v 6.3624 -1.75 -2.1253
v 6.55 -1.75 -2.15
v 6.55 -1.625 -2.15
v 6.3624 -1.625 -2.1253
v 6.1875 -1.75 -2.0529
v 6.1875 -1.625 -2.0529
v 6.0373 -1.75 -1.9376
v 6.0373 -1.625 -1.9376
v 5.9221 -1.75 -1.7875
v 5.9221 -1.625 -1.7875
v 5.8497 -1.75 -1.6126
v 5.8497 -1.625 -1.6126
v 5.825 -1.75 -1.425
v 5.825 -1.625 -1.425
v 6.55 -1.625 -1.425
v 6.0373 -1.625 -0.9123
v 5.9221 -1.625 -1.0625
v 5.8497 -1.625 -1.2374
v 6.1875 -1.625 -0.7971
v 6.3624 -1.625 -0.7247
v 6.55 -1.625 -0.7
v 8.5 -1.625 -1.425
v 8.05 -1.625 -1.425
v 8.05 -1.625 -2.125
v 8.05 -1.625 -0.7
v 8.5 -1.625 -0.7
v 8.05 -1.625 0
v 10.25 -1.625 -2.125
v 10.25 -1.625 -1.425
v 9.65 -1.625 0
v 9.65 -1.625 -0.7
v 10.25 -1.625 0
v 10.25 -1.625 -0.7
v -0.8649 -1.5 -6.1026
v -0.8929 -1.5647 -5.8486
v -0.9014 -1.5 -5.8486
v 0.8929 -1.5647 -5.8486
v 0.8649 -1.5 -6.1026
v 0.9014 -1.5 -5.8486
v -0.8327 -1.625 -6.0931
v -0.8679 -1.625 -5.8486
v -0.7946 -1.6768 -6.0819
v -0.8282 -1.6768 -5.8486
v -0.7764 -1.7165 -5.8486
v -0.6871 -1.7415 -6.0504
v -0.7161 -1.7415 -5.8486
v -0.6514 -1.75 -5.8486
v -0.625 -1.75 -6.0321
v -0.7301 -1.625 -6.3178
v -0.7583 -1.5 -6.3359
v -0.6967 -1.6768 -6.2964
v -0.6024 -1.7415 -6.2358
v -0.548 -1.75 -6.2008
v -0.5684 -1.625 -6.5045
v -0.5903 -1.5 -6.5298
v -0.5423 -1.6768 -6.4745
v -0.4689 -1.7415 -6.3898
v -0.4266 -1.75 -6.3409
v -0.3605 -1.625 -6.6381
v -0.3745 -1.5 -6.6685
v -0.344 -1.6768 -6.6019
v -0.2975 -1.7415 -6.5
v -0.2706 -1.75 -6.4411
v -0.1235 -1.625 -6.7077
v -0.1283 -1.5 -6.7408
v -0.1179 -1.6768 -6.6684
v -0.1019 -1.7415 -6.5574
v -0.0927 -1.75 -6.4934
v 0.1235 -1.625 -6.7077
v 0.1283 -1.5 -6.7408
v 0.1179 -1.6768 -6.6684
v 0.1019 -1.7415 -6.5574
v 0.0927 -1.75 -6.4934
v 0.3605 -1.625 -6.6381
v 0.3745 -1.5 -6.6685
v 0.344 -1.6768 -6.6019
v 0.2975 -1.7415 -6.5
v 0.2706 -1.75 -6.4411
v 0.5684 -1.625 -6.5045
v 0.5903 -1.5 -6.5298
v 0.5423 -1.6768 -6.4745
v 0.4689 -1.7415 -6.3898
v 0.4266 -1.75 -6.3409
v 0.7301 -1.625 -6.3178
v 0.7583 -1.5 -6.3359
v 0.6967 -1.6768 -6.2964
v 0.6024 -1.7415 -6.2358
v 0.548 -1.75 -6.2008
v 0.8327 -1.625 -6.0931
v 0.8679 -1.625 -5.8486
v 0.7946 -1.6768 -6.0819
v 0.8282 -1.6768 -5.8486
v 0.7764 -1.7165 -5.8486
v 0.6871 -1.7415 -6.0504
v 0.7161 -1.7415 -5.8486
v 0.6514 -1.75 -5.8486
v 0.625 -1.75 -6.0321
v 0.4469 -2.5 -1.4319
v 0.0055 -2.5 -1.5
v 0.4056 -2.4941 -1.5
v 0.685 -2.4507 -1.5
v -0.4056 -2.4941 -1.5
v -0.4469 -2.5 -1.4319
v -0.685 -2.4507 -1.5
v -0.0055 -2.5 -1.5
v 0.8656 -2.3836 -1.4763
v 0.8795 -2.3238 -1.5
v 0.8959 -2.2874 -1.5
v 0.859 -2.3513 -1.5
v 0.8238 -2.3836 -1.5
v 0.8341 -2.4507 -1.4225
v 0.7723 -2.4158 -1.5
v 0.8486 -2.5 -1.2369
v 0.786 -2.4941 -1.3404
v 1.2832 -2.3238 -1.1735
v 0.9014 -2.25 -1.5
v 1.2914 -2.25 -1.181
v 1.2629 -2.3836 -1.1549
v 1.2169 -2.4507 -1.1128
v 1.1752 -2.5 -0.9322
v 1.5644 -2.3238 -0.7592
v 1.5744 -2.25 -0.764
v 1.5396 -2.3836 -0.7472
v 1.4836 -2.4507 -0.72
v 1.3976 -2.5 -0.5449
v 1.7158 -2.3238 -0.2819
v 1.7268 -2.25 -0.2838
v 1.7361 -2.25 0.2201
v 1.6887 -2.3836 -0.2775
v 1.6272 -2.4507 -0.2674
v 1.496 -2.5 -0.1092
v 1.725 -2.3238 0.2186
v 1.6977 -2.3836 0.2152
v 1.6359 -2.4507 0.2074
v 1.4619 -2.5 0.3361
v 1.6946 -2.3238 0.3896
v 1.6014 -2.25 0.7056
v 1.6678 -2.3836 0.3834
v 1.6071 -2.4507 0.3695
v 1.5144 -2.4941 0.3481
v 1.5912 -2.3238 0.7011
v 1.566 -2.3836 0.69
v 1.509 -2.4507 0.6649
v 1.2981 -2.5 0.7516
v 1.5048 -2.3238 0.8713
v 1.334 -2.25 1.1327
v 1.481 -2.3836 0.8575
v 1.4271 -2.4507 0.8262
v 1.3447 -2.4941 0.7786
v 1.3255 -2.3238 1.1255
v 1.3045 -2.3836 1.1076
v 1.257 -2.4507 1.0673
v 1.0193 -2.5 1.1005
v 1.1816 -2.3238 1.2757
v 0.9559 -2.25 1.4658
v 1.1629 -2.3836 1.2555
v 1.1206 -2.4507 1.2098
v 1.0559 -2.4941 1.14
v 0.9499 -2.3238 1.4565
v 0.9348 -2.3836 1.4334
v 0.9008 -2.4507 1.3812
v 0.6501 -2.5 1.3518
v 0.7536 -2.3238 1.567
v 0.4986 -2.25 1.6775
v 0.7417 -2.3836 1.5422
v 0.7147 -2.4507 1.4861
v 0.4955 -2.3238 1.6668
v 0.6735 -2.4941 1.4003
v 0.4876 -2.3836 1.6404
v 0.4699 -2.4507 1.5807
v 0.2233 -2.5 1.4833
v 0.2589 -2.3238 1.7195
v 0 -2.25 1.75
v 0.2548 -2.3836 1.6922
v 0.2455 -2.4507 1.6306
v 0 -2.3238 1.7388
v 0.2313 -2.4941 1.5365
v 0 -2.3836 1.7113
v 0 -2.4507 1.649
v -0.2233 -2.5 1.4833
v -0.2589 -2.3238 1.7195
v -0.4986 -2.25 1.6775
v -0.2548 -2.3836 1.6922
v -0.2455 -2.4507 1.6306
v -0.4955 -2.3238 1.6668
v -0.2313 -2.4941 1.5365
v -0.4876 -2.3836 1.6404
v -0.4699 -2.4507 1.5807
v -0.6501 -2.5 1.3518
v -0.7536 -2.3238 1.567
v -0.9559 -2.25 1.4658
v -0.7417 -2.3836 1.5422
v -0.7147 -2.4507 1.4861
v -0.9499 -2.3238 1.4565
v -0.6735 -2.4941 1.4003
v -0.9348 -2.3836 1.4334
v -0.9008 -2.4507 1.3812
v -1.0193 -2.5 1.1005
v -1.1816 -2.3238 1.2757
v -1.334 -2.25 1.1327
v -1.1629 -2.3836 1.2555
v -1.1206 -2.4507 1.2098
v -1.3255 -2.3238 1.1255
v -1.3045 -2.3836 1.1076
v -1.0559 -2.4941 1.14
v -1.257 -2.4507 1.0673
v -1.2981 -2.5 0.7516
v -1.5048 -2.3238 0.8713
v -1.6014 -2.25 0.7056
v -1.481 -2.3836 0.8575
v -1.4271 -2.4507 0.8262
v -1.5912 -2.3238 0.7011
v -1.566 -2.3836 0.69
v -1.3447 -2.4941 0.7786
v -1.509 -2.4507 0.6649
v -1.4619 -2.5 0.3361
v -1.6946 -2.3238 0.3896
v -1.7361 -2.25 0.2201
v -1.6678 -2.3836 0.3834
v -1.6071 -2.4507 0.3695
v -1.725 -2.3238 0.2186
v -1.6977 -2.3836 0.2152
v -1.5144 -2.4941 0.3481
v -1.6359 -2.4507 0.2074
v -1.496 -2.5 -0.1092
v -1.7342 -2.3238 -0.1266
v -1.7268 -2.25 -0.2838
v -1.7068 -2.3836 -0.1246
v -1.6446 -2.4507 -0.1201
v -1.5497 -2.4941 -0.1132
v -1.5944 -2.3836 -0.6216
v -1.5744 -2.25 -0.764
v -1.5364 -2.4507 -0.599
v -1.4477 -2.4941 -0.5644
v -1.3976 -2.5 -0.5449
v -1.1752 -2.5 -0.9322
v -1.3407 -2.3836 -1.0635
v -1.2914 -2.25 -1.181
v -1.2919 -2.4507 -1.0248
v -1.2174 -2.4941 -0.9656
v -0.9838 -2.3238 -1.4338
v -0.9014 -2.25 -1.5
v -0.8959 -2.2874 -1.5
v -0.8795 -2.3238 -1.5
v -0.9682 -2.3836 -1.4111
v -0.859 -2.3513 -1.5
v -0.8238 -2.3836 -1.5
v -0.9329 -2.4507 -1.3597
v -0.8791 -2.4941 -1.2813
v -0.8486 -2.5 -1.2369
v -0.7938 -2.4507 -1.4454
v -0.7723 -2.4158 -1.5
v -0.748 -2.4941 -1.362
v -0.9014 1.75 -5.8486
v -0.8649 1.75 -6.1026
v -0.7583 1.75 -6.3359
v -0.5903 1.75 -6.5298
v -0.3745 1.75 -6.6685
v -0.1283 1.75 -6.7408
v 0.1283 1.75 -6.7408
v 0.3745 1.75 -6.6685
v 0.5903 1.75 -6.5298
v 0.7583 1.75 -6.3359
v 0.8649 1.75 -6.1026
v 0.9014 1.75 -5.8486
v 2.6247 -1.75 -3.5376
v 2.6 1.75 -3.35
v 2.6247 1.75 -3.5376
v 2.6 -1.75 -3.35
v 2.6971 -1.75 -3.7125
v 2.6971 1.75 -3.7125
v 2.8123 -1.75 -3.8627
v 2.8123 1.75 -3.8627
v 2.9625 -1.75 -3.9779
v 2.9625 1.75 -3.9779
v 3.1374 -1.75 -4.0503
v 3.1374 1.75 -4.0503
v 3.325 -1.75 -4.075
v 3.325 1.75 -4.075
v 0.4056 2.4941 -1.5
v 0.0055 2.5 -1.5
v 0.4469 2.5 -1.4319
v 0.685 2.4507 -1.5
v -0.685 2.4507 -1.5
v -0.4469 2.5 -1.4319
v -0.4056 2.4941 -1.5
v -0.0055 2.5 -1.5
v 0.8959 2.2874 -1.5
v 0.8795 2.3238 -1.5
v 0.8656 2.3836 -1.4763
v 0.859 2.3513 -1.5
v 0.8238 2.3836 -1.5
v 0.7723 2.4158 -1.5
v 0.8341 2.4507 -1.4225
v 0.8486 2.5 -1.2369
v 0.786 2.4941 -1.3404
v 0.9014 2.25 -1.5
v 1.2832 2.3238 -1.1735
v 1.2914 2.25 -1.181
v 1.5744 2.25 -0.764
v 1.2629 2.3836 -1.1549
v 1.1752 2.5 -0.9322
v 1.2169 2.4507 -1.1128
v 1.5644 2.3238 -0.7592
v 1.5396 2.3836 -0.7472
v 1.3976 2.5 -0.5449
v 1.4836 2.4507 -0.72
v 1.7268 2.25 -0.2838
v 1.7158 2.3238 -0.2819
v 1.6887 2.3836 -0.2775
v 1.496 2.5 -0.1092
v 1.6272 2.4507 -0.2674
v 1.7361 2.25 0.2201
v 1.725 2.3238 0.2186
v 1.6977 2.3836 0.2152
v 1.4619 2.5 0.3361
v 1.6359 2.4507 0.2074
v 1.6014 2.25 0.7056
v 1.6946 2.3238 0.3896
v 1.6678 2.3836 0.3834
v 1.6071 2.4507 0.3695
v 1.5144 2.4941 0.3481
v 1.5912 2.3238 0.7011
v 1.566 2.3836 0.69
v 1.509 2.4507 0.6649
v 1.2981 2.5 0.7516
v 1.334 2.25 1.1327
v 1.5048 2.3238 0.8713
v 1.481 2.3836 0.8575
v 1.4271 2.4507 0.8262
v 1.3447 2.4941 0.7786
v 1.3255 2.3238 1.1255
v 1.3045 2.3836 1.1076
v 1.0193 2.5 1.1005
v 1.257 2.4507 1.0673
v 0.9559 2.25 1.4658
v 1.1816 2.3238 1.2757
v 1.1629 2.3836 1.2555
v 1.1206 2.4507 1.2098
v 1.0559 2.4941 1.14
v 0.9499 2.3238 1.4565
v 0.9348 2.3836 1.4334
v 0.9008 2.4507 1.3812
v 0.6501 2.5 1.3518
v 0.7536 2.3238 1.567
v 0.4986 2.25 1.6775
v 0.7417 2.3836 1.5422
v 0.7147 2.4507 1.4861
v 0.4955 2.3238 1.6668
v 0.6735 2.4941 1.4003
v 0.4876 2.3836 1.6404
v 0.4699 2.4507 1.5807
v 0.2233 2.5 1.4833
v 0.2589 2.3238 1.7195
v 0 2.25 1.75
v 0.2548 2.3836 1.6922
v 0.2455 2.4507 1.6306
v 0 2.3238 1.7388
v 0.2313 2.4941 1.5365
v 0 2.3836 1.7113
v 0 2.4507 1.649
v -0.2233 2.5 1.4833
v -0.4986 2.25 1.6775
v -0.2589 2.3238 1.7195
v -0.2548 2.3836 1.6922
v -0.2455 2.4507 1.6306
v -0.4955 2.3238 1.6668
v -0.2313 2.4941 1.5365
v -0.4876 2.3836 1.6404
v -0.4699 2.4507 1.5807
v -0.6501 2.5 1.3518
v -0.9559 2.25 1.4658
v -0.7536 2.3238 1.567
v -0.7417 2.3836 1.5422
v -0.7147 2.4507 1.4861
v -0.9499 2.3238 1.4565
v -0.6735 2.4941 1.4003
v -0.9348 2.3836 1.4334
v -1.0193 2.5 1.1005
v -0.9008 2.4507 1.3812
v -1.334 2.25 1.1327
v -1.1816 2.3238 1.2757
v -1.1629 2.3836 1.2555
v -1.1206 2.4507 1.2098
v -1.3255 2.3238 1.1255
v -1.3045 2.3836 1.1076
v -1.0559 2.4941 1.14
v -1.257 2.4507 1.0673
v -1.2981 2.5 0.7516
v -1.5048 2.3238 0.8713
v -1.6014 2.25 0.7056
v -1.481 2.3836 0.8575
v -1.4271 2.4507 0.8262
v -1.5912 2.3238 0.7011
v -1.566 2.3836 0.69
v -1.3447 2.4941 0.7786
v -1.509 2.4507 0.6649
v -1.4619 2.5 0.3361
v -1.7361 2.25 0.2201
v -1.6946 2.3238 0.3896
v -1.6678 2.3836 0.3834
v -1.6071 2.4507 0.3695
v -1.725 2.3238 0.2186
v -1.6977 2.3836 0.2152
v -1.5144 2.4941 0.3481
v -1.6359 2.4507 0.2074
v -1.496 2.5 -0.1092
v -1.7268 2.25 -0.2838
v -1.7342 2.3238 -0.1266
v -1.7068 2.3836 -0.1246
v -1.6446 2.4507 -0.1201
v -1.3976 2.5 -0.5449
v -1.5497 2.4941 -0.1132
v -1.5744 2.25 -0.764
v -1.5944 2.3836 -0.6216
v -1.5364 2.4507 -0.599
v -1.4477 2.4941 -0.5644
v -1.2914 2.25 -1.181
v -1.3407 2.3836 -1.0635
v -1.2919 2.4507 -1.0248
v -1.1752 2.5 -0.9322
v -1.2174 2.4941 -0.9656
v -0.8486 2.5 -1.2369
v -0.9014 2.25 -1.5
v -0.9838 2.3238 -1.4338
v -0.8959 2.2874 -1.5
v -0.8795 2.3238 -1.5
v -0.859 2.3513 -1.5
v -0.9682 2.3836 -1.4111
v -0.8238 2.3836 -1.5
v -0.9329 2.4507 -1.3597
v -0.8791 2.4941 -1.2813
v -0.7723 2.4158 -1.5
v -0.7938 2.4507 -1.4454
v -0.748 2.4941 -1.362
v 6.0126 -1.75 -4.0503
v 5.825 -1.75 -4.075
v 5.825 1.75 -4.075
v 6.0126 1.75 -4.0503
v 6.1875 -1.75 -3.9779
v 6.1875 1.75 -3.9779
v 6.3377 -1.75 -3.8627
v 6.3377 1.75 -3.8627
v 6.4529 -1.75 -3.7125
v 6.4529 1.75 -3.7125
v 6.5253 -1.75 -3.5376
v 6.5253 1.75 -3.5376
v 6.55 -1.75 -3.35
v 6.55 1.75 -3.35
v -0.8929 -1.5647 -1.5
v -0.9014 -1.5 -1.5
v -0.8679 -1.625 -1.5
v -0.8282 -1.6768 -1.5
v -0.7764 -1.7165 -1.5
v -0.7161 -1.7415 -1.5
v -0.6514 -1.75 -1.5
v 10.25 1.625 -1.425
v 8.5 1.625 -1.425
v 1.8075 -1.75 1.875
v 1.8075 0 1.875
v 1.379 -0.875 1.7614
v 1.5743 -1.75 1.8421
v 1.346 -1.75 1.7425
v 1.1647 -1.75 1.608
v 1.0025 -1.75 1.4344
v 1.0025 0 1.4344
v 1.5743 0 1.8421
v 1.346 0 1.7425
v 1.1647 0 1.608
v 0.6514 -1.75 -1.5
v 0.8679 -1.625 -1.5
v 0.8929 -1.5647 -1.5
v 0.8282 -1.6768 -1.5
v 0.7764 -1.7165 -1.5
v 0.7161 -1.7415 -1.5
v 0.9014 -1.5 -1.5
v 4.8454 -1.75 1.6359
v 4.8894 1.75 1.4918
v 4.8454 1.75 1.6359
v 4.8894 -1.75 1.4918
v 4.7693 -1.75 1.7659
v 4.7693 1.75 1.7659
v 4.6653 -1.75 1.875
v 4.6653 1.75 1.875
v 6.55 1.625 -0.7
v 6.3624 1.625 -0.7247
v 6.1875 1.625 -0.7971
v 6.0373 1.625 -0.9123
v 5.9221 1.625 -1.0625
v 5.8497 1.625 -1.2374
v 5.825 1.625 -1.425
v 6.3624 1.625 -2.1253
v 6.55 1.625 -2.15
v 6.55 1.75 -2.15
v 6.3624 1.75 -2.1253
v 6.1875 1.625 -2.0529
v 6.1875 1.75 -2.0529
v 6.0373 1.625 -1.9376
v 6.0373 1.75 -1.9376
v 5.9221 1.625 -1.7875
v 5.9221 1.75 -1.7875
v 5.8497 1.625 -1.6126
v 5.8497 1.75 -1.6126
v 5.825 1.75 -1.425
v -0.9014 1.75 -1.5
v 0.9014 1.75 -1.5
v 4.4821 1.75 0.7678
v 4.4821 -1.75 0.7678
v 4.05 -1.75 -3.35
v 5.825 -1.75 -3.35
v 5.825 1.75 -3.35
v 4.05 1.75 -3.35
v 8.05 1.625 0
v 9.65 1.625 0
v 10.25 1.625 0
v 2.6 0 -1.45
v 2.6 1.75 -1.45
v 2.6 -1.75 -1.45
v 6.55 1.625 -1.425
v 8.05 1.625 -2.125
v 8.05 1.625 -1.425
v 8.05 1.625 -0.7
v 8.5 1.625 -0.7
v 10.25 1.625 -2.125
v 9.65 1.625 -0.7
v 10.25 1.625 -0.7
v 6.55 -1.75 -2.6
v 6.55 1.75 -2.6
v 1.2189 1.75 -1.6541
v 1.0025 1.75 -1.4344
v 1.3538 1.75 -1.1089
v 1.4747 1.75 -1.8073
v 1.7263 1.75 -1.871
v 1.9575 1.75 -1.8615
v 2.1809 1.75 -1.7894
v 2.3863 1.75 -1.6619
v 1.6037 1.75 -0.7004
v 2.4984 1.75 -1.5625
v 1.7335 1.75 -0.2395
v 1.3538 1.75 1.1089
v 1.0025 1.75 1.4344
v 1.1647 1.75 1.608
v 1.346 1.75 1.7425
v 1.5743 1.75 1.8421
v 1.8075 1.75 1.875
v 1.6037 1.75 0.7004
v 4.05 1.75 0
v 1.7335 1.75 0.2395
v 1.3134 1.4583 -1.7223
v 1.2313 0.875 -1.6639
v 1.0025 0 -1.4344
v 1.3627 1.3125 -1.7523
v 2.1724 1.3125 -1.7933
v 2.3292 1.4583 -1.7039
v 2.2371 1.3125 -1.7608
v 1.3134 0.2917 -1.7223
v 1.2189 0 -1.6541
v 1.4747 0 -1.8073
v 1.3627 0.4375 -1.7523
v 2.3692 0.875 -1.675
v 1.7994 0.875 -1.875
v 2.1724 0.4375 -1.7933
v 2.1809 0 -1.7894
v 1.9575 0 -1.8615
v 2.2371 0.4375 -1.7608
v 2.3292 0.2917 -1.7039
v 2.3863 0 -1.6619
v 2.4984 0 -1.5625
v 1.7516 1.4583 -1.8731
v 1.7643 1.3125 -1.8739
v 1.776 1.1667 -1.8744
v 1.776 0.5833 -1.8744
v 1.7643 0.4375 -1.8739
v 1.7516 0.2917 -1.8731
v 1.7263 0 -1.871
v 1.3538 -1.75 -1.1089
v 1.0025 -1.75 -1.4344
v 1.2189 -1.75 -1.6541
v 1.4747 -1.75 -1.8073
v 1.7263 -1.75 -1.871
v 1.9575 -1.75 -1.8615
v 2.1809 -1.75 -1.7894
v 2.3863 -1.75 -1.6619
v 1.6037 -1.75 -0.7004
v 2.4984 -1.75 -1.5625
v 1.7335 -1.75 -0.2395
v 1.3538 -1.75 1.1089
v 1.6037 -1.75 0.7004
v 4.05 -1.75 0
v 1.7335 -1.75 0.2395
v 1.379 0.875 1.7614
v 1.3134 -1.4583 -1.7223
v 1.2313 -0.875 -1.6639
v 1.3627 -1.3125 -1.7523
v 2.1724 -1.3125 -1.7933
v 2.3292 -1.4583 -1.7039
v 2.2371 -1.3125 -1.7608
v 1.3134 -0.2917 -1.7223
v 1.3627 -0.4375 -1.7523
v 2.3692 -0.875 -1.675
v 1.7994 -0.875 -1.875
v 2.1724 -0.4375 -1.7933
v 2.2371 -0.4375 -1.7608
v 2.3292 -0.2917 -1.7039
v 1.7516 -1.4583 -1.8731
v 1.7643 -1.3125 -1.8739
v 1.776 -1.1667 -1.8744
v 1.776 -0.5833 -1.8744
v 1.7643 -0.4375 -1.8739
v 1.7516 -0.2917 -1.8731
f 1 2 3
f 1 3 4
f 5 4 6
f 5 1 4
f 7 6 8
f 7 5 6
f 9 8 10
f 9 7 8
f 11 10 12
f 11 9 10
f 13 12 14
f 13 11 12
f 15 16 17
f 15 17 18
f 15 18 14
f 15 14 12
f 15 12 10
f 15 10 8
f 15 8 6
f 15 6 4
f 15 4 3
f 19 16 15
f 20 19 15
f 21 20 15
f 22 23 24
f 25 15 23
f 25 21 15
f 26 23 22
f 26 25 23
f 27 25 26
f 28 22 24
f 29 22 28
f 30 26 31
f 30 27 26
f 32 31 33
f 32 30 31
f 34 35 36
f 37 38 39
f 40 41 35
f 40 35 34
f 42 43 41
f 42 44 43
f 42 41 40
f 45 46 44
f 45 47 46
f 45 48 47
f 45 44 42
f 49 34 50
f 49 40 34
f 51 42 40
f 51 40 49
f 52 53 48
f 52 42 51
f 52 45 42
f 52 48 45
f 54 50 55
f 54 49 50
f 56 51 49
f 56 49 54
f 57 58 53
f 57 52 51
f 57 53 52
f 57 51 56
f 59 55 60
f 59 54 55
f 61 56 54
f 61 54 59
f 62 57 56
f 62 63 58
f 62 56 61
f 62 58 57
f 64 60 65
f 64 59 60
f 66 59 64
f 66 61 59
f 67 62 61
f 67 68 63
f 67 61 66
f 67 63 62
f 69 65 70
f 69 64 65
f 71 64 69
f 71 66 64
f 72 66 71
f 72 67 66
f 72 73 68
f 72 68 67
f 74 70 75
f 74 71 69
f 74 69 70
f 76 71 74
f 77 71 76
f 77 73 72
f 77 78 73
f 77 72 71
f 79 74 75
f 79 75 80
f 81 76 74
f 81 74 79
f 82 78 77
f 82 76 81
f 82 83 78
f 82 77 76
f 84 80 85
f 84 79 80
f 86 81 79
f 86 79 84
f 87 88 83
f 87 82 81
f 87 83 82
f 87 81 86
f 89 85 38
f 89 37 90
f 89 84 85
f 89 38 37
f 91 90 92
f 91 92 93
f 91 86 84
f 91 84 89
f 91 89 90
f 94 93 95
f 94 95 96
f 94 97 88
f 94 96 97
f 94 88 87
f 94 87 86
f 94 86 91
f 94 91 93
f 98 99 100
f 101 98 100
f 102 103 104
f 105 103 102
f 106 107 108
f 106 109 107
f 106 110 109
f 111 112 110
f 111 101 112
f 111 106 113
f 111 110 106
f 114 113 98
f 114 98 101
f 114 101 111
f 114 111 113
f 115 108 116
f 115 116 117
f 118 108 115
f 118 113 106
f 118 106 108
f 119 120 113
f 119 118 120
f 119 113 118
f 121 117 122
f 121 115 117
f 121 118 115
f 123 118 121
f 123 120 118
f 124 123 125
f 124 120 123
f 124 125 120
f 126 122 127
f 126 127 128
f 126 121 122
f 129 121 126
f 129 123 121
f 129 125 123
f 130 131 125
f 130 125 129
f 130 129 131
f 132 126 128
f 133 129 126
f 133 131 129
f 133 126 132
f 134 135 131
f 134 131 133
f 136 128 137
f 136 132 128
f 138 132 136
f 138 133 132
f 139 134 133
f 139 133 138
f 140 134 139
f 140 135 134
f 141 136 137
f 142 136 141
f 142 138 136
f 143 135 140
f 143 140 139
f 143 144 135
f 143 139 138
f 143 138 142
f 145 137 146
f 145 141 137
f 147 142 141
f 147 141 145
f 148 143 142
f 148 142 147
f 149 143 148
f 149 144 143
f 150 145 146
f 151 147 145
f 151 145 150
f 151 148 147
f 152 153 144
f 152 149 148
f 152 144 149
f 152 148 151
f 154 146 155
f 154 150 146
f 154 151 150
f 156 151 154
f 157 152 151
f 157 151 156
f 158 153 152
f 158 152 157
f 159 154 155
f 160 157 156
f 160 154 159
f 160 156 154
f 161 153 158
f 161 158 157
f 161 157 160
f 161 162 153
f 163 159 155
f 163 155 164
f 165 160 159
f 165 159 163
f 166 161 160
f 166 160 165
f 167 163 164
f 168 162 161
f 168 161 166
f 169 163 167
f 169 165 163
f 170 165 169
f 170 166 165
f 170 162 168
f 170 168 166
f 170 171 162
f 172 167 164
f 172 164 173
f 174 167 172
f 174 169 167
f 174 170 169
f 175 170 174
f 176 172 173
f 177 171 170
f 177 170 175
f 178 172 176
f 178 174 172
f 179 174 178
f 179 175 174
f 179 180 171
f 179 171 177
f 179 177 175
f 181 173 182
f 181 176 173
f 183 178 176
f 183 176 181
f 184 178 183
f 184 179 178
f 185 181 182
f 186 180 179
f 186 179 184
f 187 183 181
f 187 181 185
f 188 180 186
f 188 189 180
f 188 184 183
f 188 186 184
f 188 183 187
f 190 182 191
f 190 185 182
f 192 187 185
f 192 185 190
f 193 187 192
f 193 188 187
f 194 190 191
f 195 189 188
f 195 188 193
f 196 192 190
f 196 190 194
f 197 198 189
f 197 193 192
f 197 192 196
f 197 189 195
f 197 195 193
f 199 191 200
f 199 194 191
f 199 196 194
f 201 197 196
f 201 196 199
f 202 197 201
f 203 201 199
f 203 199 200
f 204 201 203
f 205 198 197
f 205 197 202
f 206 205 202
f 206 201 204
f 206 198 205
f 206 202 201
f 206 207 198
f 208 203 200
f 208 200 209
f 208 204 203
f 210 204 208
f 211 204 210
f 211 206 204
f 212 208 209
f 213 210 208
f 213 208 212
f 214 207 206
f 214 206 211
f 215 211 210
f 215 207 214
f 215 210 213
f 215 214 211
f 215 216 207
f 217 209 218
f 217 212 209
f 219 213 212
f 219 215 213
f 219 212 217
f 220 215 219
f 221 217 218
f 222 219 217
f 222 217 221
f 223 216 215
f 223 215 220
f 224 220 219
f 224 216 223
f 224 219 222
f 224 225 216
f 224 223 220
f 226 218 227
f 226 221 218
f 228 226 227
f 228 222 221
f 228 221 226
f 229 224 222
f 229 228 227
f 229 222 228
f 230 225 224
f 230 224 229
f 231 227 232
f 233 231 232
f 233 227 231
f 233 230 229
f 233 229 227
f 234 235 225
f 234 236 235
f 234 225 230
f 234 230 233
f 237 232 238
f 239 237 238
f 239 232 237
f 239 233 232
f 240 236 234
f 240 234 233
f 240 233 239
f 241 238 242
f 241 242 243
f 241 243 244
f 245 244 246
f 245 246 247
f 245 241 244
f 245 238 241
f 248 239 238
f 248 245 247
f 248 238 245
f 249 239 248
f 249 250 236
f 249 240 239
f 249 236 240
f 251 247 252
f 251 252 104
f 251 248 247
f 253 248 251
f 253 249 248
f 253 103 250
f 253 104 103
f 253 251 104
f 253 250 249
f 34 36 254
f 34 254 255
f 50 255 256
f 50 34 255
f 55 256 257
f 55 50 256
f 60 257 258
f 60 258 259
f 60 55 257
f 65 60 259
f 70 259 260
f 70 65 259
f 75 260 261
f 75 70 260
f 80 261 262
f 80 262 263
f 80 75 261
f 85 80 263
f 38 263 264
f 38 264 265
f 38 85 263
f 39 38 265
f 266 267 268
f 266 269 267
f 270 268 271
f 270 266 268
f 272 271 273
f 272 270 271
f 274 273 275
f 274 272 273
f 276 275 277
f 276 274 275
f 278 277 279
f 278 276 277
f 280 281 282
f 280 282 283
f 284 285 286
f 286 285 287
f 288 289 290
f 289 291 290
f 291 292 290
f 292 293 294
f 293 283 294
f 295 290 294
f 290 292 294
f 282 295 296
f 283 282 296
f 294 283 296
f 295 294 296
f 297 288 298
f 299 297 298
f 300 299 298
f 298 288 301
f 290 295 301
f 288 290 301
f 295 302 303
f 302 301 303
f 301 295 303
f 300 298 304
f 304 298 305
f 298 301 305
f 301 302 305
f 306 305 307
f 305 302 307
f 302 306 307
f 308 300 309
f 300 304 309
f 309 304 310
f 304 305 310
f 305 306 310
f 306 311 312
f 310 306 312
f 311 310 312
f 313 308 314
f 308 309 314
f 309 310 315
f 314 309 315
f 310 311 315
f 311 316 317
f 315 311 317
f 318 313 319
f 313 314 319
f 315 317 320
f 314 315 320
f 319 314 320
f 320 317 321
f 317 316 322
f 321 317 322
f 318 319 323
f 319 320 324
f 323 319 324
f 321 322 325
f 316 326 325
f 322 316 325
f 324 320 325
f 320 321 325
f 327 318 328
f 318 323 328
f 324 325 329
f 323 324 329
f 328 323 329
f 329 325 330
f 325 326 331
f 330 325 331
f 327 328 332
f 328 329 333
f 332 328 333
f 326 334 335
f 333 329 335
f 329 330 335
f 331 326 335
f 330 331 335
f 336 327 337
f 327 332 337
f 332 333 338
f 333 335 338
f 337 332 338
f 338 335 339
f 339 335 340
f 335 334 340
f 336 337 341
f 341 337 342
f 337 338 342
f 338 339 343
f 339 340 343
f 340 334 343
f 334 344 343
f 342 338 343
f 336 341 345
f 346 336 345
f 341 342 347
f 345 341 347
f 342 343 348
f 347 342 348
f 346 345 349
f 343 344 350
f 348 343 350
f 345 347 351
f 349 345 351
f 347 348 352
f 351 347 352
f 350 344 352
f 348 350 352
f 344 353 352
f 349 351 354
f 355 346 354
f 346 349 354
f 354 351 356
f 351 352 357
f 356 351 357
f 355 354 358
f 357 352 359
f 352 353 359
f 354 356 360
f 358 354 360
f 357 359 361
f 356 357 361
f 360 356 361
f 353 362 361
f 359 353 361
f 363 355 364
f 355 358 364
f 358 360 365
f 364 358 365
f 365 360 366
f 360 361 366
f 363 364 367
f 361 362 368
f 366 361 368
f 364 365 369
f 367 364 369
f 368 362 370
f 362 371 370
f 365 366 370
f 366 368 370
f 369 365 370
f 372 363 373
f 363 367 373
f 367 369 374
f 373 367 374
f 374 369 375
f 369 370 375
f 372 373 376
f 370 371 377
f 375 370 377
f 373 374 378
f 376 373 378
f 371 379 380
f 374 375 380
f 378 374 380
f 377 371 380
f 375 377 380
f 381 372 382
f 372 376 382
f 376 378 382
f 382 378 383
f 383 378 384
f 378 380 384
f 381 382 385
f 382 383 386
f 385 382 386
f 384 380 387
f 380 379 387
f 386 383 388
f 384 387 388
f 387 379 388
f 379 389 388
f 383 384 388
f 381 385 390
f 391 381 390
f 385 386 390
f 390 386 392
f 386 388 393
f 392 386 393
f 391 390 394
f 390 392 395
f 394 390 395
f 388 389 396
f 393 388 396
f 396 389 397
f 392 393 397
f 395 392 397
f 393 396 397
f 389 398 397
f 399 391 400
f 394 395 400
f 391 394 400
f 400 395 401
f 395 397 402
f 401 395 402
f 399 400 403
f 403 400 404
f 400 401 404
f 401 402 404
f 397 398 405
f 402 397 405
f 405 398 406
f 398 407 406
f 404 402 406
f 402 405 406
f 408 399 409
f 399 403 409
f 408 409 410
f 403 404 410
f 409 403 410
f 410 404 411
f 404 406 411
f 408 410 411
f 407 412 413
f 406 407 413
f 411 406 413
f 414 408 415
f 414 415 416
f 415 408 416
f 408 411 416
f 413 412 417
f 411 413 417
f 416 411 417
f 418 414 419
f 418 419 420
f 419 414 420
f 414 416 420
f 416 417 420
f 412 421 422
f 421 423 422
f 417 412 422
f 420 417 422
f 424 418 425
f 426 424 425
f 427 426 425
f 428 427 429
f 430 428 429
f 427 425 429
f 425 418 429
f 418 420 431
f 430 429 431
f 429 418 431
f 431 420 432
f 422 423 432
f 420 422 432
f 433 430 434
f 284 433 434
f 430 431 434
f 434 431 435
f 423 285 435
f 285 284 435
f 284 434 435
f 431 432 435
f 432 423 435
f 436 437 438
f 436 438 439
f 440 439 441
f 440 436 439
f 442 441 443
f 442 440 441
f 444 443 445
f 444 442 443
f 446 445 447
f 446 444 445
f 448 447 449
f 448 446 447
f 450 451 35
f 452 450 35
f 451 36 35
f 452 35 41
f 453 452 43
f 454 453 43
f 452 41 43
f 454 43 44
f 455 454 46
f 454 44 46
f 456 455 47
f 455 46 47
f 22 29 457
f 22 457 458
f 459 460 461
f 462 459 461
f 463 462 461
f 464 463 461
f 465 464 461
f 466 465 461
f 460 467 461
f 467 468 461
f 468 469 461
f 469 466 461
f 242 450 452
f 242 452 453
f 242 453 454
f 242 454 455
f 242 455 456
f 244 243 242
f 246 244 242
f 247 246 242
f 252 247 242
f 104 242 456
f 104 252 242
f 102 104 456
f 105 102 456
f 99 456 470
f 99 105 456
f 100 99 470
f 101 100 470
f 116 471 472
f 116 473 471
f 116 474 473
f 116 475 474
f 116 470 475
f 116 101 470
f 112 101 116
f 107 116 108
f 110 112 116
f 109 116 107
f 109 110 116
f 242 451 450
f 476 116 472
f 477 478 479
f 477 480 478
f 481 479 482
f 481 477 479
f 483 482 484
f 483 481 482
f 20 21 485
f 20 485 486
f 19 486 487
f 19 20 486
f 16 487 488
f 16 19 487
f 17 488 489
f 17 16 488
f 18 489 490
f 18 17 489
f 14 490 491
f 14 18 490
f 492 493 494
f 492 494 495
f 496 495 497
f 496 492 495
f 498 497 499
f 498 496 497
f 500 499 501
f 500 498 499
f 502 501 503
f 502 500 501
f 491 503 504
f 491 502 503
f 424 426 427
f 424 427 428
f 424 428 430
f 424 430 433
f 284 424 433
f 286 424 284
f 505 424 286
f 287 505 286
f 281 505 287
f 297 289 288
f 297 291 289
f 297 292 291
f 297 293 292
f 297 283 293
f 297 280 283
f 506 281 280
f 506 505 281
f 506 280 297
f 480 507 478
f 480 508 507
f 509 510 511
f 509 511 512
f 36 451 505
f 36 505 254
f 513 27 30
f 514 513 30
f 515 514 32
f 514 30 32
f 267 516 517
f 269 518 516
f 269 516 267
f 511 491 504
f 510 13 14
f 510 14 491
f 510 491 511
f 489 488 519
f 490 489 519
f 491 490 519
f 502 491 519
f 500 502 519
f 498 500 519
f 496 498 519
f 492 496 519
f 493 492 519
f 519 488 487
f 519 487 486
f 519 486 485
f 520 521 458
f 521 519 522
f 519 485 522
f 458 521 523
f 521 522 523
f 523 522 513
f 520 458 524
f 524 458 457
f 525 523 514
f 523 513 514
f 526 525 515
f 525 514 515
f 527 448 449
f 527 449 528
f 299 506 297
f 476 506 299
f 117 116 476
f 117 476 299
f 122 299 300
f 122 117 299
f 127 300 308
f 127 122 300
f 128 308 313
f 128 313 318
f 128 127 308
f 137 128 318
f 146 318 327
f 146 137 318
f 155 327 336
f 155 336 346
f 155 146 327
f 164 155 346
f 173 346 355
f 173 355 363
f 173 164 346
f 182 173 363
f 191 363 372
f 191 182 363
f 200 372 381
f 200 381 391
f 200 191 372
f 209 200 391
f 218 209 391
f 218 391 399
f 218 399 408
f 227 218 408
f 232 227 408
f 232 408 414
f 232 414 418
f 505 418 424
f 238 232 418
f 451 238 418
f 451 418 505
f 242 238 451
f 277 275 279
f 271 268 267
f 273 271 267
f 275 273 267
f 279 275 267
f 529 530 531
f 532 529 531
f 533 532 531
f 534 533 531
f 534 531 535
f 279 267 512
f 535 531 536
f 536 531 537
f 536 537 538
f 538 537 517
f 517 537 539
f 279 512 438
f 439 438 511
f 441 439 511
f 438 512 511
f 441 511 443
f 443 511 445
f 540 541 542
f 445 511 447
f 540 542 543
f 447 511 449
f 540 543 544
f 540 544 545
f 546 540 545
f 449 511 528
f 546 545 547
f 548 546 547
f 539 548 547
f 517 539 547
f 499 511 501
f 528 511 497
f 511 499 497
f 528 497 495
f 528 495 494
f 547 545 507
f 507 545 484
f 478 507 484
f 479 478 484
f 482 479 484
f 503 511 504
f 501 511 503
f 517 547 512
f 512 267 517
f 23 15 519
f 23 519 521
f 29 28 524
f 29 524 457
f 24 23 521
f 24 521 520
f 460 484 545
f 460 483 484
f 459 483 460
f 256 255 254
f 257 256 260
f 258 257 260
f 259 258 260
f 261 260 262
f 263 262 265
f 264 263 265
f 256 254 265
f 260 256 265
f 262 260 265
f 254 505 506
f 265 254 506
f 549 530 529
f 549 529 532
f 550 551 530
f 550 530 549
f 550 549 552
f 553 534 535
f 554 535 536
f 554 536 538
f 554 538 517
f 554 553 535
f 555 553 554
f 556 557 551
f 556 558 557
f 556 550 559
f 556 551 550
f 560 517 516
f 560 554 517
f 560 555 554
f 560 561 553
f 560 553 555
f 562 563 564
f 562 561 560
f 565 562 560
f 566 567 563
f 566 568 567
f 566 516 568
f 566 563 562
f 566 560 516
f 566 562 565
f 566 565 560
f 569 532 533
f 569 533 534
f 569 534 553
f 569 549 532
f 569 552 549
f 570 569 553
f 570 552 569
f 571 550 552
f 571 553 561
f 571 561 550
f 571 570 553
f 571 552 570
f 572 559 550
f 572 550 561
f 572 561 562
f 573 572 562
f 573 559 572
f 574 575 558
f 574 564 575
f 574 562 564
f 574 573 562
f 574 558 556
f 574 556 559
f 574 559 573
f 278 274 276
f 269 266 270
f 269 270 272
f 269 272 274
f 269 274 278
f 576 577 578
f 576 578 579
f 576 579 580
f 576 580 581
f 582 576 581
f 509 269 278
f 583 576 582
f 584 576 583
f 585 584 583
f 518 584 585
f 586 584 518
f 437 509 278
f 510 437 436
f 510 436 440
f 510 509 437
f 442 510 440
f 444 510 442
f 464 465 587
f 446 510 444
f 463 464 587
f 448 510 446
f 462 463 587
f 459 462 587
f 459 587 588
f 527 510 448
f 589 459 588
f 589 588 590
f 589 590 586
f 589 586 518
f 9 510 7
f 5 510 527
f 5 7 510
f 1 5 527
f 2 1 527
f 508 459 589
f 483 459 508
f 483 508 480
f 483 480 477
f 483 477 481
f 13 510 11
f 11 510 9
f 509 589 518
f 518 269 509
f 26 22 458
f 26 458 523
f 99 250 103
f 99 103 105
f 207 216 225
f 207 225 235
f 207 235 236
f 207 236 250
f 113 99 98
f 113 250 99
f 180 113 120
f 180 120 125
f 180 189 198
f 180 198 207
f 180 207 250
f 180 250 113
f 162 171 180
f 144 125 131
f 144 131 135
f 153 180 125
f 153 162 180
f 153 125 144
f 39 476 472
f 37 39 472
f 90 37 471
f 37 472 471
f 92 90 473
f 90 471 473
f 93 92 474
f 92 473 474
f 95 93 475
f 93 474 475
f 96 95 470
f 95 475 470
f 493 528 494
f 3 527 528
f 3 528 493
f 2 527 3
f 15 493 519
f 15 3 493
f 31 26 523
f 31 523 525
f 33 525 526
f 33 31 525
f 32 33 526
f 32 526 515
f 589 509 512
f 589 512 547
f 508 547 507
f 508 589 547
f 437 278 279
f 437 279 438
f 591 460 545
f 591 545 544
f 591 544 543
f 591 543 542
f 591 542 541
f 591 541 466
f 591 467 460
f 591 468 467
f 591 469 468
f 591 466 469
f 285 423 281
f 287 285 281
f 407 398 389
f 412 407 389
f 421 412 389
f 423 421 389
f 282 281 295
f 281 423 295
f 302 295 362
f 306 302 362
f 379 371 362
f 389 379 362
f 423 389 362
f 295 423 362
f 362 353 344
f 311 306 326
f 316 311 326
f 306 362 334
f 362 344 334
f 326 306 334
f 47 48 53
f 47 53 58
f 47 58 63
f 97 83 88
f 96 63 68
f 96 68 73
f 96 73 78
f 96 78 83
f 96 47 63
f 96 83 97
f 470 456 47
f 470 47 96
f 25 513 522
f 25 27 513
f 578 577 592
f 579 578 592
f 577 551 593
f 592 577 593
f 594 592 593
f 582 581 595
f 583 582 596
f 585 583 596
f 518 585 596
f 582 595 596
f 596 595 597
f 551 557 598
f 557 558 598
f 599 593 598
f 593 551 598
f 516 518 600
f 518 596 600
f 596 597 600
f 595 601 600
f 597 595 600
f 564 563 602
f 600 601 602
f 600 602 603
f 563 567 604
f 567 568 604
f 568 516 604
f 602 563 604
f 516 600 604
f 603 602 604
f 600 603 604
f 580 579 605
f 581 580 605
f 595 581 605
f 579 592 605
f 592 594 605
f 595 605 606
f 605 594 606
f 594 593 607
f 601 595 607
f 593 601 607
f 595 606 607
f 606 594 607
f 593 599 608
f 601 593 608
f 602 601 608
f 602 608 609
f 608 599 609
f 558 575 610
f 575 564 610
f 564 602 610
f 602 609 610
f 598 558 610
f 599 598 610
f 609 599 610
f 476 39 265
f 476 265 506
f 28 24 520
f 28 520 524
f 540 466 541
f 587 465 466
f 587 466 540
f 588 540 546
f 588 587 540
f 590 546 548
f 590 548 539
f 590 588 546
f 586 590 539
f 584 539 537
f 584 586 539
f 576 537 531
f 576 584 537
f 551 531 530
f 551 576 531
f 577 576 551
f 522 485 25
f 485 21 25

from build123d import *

# Parameters (mm, degrees)
F1_DEPTH = 2.5
F2_DEPTH = 1.75
F3_R     = 0.24999
F6_DEPTH = 1.75
F7_DEPTH = 1.75
F5_W     = 0.725
F5_H     = 0.725
F8_DEPTH = 1.75
F5_W_2   = 1.5000037169
F5_H_2   = 0.7249962804
F5_W_3   = 0.6
F5_H_3   = 0.6999998717
F5_H_4   = 0.6999961522
F9_DEPTH = 1.625


# Not quite as in the source:
# - a fillet or chamfer is up to 0.001 mm smaller than in the source, because OpenCascade refuses the exact size
# - ends of sketch curves that miss each other by under 0.0002 mm in the source are joined


with BuildPart() as f1:
    # F0 (on Front) → F1 (new body, symmetric)
    with BuildSketch(Plane.XZ):
        with BuildLine():
            Line((-0.9013878189, -1.5), (0.9013878189, -1.5))
            ThreePointArc((0.9013878189, -1.5), (0, 1.75), (-0.9013878189, -1.5))
        make_face()
    extrude(amount=F1_DEPTH, both=True)

    # F0 (on Front) → F2 (join, symmetric)
    with BuildSketch(Plane.XZ):
        with BuildLine():
            Line((0.9013878189, -5.8486121811), (0.9013878189, -1.5))
            Line((0.9013878189, -1.5), (-0.9013878189, -1.5))
            Line((-0.9013878189, -1.5), (-0.9013878189, -5.8486121811))
            ThreePointArc((-0.9013878189, -5.8486121811), (0, -6.75), (0.9013878189, -5.8486121811))
        make_face()
    extrude(amount=F2_DEPTH, both=True)

    # F3 (radius 0.25 in the source; OpenCascade refuses exactly that, so slightly less here)
    f3_edges = [f1.edges().sort_by_distance(p)[0] for p in [
        (-0.901388, -1.75, -3.674306),
        (0, -2.5, 1.75),
        (0, 2.5, 1.75),
    ]]
    fillet(f3_edges, radius=F3_R)


with BuildPart() as f6:
    # F5 (on Front) → F6 (new body, symmetric)
    with BuildSketch(Plane.XZ):
        with BuildLine():
            ThreePointArc((1.0024869547, 1.4344057675), (1.75, 0), (1.0024869547, -1.4344057675))
            add(Edge.make_bspline(
                [(1.0024869563, -1.4344057663), (1.7969250862, -2.4375739072), (2.6000000016, -1.4500000013)],
                knots=[5.5834557893, 5.5834557893, 5.5834557893, 6.9698995825, 6.9698995825, 6.9698995825], degree=2, weights=[1, 0.7691911586, 1]))
            add(Edge.make_bspline(
                [(2.6000000016, -1.4500000013), (5.303822052, 1.8750000109), (1.8075004381, 1.875)],
                knots=[0.6867142753, 0.6867142753, 0.6867142753, 3.1415926557, 3.1415926557, 3.1415926557], degree=2, weights=[1, 0.3366501631, 1]))
            add(Edge.make_bspline(
                [(1.8075004381, 1.875), (1.3514063883, 1.8749999986), (1.0024869563, 1.4344057663)],
                knots=[3.1415926557, 3.1415926557, 3.1415926557, 3.8413221714, 3.8413221714, 3.8413221714], degree=2, weights=[1, 0.9394190785, 1]))
        make_face()
    extrude(amount=F6_DEPTH, both=True)

    # F5 (on Front) → F7 (join, symmetric)
    with BuildSketch(Plane.XZ):
        with BuildLine():
            add(Edge.make_bspline(
                [(2.6000000016, -1.4500000013), (5.303822052, 1.8750000109), (1.8075004381, 1.875)],
                knots=[0.6867142753, 0.6867142753, 0.6867142753, 3.1415926557, 3.1415926557, 3.1415926557], degree=2, weights=[1, 0.3366501631, 1]))
            Line((2.6, -1.45), (2.6, -3.35))
            Line((2.6, -3.35), (4.05, -3.35))
            Line((4.05, -3.35), (4.05, 0))
            Line((4.05, 0), (4.4820705548, 0.7678400066))
            ThreePointArc((4.4820705548, 0.7678400066), (3.6888877758, 1.0468947244), (3.8346688069, 1.875))
            Line((3.8346688069, 1.875), (1.8075004381, 1.875))
        make_face()
        with BuildLine():
            Line((4.6653311931, 1.875), (3.8346688069, 1.875))
            ThreePointArc((3.8346688069, 1.875), (3.6888877758, 1.0468947244), (4.4820705548, 0.7678400066))
            Line((4.4820705548, 0.7678400066), (4.8894271065, 1.4917603336))
            ThreePointArc((4.8894271065, 1.4917603336), (4.8111122242, 1.7031052756), (4.6653311931, 1.875))
        make_face()
    extrude(amount=F7_DEPTH, both=True)

    # F5 (on Front) → F8 (join, symmetric)
    with BuildSketch(Plane.XZ):
        with BuildLine():
            Line((4.05, -3.35), (2.6, -3.35))
            ThreePointArc((2.6, -3.35), (2.8123475836, -3.8626524164), (3.325, -4.075))
            ThreePointArc((3.325, -4.075), (3.8376524164, -3.8626524164), (4.05, -3.35))
        make_face()
        with BuildLine():
            Line((5.1000000026, -3.35), (4.05, -3.35))
            ThreePointArc((4.05, -3.35), (3.8376524164, -3.8626524164), (3.325, -4.075))
            Line((3.325, -4.075), (5.1000000026, -4.075))
            Line((5.1000000026, -4.075), (5.1000000026, -3.35))
        make_face()
        with Locations((5.4625000026, -3.7125)):
            Rectangle(F5_W, F5_H)
        with BuildLine():
            Line((5.8250000026, -2.625), (5.8250000026, -3.35))
            Line((5.8250000026, -3.35), (5.8250000026, -4.075))
            ThreePointArc((5.8250000026, -4.075), (6.337652419, -3.8626524164), (6.5500000026, -3.35))
            ThreePointArc((6.5500000026, -3.35), (6.337652419, -2.8373475836), (5.8250000026, -2.625))
        make_face()
        with BuildLine():
            Line((5.8250000026, -2.5999961522), (5.8250000026, -2.625))
            ThreePointArc((5.8250000026, -2.625), (6.337652419, -2.8373475836), (6.5500000026, -3.35))
            Line((6.5500000026, -3.35), (6.5499962831, -2.5999961522))
            Line((6.5499962831, -2.5999961522), (5.8250000026, -2.5999961522))
        make_face()
        with BuildLine():
            Line((5.8250000026, -1.4249961522), (5.8250000026, -2.5999961522))
            Line((5.8250000026, -2.5999961522), (6.5499962831, -2.5999961522))
            Line((6.5499962831, -2.5999961522), (6.5499962831, -2.1499924326))
            ThreePointArc((6.5499962831, -2.1499924326), (6.0373464968, -1.9376459384), (5.8250000026, -1.4249961522))
        make_face()
    extrude(amount=F8_DEPTH, both=True)

    # F5 (on Front) → F9 (join, symmetric)
    with BuildSketch(Plane.XZ):
        with BuildLine():
            ThreePointArc((6.5499962831, -0.6999998717), (6.0373464968, -0.9123463659), (5.8250000026, -1.4249961522))
            ThreePointArc((5.8250000026, -1.4249961522), (6.0373464968, -1.9376459384), (6.5499962831, -2.1499924326))
            Line((6.5499962831, -2.1499924326), (6.5499962831, -1.4249961522))
            Line((6.5499962831, -1.4249961522), (6.5499962831, -0.6999998717))
        make_face()
        with Locations((7.2999981415, -1.0624980119)):
            Rectangle(F5_W_2, F5_H_2)
        Polygon((8.05, 0), (8.05, -0.6999998717), (8.05, -1.4249961522), (8.05, -2.1249961522), (9.65, -2.1249961522), (9.65, -1.425), (8.5, -1.425), (8.5, -0.6999998717), (9.65, -0.6999998717), (9.65, 0), align=None)
        with Locations((9.95, -0.3499999359)):
            Rectangle(F5_W_3, F5_H_3)
        with Locations((9.95, -1.7749980761)):
            Rectangle(F5_W_3, F5_H_4)
    extrude(amount=F9_DEPTH, both=True)


solid = Compound([f1.part, f6.part])
